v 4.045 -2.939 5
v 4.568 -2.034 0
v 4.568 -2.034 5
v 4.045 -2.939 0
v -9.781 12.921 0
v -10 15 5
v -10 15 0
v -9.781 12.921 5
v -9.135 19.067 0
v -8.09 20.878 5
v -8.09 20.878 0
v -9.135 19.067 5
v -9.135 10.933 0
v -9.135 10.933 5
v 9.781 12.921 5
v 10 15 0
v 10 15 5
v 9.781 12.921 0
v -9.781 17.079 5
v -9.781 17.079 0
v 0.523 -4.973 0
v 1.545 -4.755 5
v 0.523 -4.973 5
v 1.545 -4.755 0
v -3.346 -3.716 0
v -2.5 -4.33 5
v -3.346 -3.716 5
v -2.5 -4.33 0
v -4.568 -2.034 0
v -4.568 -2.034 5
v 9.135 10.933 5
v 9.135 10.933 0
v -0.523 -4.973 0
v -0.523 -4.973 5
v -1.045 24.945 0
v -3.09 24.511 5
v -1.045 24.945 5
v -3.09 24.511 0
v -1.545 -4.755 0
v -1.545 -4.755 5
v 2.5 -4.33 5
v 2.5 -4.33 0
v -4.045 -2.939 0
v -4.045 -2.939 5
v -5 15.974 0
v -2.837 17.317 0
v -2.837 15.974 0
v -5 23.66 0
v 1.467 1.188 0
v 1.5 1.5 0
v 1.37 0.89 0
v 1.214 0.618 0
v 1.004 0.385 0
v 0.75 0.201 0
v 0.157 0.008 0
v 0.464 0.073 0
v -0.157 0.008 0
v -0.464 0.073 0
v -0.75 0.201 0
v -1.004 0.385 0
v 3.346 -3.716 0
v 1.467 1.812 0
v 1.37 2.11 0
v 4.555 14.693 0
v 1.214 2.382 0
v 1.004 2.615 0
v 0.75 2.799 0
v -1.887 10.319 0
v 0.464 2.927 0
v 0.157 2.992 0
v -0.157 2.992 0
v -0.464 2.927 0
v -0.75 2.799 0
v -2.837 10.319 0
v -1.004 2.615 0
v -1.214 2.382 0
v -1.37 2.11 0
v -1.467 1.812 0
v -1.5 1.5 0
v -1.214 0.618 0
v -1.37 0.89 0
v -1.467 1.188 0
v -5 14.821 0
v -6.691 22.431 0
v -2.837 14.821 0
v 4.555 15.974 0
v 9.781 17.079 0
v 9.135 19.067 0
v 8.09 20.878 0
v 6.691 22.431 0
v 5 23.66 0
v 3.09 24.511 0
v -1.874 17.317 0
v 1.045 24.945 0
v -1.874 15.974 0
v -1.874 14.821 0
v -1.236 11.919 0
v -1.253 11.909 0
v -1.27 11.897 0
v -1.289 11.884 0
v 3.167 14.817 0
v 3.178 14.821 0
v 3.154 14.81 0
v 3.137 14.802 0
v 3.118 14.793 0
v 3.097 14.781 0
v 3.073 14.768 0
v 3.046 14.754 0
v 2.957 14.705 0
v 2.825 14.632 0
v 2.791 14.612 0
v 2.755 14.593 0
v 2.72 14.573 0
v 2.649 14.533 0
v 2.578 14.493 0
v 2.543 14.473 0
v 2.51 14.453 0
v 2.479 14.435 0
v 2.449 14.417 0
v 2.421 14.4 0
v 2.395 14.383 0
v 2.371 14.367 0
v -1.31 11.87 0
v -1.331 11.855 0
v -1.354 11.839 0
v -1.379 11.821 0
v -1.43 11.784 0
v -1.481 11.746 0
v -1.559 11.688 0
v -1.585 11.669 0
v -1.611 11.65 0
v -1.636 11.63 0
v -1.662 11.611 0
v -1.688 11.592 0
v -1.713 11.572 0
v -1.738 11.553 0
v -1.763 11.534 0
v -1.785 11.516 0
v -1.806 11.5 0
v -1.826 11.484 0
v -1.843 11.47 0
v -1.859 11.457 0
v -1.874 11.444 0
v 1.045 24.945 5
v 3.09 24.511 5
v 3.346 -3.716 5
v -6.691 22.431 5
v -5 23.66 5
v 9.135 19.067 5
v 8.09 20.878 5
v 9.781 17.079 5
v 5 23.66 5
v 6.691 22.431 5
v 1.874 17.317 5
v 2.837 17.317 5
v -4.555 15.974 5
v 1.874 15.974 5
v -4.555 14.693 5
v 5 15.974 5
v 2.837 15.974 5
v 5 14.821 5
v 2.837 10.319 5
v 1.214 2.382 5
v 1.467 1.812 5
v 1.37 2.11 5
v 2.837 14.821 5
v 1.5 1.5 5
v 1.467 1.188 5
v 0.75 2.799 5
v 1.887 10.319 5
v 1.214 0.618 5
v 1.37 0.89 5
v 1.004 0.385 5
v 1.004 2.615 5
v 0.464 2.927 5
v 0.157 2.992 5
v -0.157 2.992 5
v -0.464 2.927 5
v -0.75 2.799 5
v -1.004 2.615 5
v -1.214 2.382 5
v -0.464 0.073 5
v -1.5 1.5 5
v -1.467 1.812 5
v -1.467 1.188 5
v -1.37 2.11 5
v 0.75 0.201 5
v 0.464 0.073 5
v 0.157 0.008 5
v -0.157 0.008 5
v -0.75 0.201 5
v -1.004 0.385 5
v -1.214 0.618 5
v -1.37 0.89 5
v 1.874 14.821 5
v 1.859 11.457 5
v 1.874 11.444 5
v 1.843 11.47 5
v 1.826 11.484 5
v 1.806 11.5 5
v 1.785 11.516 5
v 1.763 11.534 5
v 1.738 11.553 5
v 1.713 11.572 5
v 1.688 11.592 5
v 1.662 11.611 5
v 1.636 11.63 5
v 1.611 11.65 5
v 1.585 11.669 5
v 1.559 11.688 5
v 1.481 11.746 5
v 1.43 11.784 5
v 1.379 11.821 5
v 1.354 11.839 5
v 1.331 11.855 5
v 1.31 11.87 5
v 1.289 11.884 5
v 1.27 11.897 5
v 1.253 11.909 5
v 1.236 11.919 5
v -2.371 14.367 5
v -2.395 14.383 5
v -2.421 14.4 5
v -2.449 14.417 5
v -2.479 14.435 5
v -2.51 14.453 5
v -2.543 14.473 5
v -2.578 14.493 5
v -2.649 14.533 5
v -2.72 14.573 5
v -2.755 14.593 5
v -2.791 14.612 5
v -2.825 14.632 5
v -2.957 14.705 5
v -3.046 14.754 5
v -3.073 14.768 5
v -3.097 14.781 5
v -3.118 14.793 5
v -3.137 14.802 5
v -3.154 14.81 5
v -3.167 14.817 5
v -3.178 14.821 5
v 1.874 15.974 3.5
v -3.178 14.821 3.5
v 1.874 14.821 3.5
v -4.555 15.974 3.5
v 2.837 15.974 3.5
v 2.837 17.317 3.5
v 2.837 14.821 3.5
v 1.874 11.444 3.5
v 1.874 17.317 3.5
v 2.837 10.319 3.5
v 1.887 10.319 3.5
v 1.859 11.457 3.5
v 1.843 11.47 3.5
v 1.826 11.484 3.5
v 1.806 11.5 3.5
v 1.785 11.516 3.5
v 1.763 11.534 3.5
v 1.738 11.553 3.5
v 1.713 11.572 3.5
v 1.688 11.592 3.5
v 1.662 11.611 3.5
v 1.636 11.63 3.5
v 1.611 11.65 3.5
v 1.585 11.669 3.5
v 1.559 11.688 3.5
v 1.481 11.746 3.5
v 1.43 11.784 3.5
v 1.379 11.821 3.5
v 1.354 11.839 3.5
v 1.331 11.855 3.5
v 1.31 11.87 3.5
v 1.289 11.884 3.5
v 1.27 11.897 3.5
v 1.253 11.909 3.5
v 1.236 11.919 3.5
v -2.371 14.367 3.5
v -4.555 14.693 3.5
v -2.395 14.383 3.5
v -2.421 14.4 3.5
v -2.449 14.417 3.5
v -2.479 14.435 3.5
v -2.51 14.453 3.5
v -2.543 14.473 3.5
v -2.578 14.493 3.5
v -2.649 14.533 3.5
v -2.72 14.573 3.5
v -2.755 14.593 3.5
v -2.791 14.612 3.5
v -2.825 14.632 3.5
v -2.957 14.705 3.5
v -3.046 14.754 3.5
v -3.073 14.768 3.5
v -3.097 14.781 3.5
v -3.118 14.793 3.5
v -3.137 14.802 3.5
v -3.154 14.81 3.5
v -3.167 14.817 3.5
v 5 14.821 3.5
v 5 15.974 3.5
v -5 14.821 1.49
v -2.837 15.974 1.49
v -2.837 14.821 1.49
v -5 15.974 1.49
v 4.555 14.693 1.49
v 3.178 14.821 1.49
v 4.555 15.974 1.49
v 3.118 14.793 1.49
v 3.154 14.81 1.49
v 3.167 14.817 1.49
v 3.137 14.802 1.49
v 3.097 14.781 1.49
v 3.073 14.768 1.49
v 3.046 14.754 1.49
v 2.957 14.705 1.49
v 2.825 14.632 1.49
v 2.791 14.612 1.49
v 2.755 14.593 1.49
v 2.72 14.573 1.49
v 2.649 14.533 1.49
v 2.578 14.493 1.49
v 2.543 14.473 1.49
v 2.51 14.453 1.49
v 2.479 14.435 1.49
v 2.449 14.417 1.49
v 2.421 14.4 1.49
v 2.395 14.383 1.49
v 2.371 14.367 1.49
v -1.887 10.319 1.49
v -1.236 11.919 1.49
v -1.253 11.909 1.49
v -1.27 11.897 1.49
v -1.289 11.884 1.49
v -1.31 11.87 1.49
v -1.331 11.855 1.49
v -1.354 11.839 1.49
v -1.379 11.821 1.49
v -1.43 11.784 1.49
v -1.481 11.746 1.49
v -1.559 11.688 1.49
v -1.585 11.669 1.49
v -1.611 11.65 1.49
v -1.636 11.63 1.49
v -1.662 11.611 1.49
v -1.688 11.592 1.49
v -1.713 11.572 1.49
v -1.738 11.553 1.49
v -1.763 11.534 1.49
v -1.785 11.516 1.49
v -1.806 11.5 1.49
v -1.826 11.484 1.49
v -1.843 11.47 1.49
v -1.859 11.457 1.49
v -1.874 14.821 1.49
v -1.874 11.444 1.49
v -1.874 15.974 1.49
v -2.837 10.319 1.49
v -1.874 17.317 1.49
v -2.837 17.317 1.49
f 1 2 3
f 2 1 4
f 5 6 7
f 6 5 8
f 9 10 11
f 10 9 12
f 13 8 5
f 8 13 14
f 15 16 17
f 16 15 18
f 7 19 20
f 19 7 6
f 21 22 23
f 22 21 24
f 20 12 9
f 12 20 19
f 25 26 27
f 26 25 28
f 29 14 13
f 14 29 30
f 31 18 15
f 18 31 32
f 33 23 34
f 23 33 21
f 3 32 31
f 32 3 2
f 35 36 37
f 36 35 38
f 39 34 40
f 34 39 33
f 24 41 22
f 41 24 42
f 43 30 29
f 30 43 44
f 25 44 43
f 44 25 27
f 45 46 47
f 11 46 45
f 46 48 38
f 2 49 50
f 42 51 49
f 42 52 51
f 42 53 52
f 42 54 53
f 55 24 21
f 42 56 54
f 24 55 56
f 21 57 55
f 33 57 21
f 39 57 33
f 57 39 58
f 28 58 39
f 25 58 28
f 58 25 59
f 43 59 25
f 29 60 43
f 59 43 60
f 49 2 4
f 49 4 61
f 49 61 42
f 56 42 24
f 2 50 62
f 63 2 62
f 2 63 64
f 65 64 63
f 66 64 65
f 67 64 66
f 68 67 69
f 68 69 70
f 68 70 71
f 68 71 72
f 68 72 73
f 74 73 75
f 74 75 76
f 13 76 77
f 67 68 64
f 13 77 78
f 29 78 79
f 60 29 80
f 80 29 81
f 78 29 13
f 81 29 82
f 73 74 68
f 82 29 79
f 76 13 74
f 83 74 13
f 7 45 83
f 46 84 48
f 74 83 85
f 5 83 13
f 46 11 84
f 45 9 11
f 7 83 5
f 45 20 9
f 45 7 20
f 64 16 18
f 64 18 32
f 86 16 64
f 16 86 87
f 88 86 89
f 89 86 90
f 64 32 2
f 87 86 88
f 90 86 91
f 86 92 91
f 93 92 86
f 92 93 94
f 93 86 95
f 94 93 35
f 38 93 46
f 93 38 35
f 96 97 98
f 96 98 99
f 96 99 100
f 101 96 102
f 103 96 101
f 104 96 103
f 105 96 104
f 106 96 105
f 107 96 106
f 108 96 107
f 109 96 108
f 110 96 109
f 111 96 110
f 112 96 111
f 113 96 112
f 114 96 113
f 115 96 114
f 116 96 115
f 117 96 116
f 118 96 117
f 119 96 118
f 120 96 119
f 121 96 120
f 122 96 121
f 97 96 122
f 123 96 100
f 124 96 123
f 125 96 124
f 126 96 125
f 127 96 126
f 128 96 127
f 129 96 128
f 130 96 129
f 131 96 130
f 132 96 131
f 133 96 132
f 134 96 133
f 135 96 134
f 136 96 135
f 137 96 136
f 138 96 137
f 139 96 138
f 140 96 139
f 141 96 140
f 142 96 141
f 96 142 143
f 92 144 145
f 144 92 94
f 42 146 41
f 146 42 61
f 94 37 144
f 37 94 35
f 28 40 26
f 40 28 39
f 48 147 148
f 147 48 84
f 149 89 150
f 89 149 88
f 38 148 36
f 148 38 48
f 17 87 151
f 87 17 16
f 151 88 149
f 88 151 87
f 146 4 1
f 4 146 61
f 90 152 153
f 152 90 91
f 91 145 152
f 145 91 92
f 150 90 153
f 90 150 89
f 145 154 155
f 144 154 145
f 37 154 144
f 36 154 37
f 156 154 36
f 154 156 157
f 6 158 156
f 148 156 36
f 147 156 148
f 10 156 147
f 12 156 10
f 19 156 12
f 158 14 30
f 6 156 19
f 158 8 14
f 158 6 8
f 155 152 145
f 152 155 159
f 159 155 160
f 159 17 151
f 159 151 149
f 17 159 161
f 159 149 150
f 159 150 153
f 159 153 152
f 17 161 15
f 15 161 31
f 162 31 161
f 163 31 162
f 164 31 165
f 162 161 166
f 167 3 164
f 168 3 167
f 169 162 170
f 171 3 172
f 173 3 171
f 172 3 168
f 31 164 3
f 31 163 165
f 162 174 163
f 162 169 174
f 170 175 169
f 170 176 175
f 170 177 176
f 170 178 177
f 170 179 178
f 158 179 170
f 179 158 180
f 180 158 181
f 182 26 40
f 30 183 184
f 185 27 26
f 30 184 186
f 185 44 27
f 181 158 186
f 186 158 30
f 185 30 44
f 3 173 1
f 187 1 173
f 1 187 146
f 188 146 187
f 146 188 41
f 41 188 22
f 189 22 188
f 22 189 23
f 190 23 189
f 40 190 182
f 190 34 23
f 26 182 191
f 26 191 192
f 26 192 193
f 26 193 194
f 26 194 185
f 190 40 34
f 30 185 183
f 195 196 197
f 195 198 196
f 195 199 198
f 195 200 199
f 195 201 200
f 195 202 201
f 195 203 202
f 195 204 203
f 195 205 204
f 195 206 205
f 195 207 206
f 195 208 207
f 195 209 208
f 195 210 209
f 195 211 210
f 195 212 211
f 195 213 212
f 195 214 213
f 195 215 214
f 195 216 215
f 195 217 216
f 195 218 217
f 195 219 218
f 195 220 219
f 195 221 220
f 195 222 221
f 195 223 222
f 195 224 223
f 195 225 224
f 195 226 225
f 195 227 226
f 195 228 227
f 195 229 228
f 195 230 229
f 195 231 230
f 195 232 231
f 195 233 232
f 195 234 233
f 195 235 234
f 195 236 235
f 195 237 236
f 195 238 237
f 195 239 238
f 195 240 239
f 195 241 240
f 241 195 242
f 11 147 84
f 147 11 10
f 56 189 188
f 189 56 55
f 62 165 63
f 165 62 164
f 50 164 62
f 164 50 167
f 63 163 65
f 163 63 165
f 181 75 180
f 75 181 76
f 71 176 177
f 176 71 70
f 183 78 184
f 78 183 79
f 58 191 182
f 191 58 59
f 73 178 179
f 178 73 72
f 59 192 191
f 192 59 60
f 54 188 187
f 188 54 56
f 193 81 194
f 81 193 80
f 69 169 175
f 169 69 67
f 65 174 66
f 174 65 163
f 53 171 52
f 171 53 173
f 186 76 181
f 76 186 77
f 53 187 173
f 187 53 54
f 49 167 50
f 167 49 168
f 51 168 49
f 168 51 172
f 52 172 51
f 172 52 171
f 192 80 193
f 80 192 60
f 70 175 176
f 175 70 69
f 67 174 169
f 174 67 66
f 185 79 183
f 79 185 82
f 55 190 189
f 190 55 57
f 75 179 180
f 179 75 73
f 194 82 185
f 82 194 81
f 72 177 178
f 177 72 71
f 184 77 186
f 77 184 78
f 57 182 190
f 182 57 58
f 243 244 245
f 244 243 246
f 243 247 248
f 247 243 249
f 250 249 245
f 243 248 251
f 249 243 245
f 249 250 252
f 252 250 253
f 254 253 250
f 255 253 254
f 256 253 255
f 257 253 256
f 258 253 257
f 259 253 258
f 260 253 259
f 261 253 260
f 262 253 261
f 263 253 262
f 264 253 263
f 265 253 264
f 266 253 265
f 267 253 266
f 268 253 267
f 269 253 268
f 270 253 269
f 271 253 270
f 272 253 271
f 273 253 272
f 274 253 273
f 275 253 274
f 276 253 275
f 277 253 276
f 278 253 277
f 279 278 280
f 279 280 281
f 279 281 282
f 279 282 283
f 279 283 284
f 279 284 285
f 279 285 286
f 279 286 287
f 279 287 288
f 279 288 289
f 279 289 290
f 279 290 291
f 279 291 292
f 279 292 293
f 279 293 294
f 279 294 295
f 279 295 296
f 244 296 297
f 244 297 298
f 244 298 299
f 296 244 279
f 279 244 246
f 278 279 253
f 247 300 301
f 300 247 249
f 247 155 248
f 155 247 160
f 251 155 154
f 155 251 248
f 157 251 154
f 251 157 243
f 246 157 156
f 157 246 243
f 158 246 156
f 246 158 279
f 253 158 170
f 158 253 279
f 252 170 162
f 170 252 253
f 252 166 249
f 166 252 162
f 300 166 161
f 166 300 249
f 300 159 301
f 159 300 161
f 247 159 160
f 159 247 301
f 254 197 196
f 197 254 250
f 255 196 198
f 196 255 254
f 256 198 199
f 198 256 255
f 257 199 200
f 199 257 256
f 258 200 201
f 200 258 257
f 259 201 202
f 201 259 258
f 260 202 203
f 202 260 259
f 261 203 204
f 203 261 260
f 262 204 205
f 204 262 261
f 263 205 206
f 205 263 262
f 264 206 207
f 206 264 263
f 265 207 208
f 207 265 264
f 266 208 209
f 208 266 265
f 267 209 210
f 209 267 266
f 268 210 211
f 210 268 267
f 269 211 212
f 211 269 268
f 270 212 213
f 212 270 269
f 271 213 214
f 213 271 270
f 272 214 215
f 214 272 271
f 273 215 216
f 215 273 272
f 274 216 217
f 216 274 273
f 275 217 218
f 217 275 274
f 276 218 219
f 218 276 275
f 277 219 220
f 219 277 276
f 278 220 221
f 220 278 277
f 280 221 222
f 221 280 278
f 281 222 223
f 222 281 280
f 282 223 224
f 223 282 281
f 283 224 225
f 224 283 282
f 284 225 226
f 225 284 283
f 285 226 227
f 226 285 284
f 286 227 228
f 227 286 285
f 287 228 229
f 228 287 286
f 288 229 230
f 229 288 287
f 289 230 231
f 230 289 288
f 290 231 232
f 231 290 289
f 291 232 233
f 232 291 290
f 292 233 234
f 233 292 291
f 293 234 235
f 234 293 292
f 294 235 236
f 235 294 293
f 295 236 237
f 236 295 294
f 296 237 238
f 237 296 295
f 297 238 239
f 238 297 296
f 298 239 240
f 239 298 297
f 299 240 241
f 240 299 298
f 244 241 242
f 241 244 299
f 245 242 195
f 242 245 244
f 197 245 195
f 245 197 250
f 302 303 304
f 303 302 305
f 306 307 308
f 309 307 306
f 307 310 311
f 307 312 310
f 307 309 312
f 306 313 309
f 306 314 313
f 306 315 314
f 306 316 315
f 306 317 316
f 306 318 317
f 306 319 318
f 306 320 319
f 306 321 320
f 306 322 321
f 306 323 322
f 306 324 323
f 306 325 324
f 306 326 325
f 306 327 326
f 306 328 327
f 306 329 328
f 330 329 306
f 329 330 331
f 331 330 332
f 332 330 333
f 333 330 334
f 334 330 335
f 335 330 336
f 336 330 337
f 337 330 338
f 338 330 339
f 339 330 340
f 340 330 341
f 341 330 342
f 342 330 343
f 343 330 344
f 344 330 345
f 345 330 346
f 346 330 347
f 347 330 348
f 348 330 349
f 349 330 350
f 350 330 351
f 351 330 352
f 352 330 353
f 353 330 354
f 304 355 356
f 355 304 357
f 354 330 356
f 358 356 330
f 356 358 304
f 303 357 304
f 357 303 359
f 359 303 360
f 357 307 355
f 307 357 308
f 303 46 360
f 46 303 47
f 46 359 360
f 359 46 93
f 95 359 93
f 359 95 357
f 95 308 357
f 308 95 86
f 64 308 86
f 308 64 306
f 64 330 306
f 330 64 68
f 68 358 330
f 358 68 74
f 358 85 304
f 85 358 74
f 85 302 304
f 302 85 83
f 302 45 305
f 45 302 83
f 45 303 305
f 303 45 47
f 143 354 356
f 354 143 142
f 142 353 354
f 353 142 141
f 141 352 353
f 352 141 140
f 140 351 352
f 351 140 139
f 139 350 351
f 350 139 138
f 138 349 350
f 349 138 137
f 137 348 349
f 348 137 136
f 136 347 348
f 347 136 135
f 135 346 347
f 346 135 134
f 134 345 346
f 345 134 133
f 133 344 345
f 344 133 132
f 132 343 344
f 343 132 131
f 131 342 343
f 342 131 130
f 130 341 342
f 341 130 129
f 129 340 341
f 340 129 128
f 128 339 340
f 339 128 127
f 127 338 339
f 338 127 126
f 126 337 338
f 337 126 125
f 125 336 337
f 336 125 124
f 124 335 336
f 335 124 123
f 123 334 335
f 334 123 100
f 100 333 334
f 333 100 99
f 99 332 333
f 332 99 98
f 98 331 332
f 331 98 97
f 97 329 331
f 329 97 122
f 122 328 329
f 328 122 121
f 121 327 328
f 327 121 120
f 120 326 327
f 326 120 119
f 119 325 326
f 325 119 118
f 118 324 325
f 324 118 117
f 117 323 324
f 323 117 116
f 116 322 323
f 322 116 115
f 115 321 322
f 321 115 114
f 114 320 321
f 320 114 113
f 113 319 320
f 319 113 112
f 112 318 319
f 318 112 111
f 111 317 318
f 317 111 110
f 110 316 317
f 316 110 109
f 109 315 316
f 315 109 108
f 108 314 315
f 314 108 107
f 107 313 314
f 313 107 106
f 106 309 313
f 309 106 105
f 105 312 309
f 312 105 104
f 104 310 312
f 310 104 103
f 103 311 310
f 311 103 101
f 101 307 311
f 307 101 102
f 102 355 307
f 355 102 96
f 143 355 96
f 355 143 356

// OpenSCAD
text="4";


keyring_hole_dia = 3;
tag_thickness=5;
text_depth = 1.5;
$fn=30;

difference() {
    hull() {
    
    cylinder(r=5,tag_thickness);
    translate([0,15,0]) cylinder(r=10, h=tag_thickness);
}
translate([0,1.5,-0.1]) cylinder(r=keyring_hole_dia/2, h=tag_thickness+0.2);


translate([5,10,tag_thickness-text_depth]) linear_extrude(height=text_depth+0.1)  rotate([0,0,0],a=90) text(text,$fn=50);
translate([-5,10,-0.01]) mirror([0.01,0,0])  linear_extrude(height=text_depth)  rotate([0,0,0],a=90) text(text,$fn=50);

}
